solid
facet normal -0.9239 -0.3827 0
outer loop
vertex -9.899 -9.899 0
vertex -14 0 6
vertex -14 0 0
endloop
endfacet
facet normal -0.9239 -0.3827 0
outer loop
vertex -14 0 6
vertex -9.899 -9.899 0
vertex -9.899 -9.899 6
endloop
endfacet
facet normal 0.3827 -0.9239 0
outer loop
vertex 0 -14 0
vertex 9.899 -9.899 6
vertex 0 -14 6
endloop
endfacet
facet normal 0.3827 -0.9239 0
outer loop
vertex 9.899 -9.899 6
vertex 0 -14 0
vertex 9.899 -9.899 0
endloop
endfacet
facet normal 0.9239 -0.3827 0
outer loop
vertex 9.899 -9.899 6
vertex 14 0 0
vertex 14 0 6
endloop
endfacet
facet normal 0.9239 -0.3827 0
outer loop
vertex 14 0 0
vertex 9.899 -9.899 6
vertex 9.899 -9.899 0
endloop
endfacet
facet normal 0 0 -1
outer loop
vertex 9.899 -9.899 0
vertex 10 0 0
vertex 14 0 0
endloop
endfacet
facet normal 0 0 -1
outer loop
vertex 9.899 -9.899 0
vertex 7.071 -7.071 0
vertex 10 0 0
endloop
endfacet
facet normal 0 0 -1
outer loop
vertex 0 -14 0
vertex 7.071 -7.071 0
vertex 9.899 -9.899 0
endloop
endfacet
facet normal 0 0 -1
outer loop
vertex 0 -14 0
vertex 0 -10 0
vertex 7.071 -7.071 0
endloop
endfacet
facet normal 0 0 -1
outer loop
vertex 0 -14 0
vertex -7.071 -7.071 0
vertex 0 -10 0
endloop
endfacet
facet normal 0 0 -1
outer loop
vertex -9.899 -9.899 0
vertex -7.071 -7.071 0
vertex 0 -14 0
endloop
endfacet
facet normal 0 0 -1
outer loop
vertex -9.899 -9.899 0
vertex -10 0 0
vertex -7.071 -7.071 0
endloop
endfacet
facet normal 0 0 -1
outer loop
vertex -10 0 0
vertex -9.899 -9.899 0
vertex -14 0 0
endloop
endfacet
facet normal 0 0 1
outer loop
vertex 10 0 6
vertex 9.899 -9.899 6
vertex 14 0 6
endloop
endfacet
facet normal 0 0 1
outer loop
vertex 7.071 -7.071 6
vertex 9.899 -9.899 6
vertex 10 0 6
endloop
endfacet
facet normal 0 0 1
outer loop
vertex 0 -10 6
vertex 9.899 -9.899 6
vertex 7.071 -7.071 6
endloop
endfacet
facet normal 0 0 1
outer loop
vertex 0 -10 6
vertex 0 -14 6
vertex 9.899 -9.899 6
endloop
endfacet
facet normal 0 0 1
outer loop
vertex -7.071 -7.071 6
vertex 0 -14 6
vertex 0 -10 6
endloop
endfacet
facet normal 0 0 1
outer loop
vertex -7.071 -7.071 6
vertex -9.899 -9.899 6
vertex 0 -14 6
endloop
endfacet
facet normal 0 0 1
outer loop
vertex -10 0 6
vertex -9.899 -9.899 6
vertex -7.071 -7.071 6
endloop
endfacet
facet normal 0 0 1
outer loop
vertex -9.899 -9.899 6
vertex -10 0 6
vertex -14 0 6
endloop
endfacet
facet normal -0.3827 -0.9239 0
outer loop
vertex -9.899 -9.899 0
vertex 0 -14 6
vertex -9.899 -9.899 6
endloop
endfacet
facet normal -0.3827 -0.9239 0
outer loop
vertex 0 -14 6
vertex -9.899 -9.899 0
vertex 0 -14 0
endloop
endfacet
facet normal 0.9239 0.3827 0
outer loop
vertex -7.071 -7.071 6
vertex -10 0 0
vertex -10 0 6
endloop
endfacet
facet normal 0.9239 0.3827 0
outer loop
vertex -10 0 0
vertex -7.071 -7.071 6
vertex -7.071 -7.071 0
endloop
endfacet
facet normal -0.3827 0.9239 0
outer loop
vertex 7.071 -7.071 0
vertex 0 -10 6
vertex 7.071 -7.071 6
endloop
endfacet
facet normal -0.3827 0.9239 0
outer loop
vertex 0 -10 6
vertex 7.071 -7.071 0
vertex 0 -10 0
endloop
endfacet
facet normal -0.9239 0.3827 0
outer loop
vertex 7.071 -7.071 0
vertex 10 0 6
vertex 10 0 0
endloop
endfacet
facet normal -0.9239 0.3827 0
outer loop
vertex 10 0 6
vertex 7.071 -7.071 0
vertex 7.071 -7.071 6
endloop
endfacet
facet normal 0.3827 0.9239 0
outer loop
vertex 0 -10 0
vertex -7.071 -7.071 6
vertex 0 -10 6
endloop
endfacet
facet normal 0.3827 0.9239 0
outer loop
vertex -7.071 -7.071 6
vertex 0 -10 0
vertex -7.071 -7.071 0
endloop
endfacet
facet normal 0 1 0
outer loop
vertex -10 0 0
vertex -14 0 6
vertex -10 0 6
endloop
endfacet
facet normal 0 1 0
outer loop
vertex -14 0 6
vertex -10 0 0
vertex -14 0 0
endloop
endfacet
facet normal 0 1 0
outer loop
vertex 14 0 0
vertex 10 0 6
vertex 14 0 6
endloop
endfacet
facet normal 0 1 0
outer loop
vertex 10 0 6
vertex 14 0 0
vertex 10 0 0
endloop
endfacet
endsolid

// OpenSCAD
$fn = 50;

difference() {
	union() {
		difference() {
			difference() {
				linear_extrude(height = 6) {
					polygon(points = [[14.0, 0.0], [9.899494936611665, 9.899494936611665], [8.572527594031472e-16, 14.0], [-9.899494936611664, 9.899494936611665], [-14.0, 1.7145055188062944e-15], [-9.899494936611667, -9.899494936611664], [-2.5717582782094417e-15, -14.0], [9.899494936611664, -9.899494936611667]]);
				}
				linear_extrude(height = 6) {
					polygon(points = [[10.0, 0.0], [7.0710678118654755, 7.0710678118654755], [6.123233995736766e-16, 10.0], [-7.071067811865475, 7.0710678118654755], [-10.0, 1.2246467991473533e-15], [-7.071067811865477, -7.071067811865475], [-1.8369701987210296e-15, -10.0], [7.071067811865474, -7.071067811865477]]);
				}
			}
			translate(v = [0, 7.0, 3.0]) {
				cube(center = true, size = [28, 14, 6]);
			}
		}
	}
	union();
}
